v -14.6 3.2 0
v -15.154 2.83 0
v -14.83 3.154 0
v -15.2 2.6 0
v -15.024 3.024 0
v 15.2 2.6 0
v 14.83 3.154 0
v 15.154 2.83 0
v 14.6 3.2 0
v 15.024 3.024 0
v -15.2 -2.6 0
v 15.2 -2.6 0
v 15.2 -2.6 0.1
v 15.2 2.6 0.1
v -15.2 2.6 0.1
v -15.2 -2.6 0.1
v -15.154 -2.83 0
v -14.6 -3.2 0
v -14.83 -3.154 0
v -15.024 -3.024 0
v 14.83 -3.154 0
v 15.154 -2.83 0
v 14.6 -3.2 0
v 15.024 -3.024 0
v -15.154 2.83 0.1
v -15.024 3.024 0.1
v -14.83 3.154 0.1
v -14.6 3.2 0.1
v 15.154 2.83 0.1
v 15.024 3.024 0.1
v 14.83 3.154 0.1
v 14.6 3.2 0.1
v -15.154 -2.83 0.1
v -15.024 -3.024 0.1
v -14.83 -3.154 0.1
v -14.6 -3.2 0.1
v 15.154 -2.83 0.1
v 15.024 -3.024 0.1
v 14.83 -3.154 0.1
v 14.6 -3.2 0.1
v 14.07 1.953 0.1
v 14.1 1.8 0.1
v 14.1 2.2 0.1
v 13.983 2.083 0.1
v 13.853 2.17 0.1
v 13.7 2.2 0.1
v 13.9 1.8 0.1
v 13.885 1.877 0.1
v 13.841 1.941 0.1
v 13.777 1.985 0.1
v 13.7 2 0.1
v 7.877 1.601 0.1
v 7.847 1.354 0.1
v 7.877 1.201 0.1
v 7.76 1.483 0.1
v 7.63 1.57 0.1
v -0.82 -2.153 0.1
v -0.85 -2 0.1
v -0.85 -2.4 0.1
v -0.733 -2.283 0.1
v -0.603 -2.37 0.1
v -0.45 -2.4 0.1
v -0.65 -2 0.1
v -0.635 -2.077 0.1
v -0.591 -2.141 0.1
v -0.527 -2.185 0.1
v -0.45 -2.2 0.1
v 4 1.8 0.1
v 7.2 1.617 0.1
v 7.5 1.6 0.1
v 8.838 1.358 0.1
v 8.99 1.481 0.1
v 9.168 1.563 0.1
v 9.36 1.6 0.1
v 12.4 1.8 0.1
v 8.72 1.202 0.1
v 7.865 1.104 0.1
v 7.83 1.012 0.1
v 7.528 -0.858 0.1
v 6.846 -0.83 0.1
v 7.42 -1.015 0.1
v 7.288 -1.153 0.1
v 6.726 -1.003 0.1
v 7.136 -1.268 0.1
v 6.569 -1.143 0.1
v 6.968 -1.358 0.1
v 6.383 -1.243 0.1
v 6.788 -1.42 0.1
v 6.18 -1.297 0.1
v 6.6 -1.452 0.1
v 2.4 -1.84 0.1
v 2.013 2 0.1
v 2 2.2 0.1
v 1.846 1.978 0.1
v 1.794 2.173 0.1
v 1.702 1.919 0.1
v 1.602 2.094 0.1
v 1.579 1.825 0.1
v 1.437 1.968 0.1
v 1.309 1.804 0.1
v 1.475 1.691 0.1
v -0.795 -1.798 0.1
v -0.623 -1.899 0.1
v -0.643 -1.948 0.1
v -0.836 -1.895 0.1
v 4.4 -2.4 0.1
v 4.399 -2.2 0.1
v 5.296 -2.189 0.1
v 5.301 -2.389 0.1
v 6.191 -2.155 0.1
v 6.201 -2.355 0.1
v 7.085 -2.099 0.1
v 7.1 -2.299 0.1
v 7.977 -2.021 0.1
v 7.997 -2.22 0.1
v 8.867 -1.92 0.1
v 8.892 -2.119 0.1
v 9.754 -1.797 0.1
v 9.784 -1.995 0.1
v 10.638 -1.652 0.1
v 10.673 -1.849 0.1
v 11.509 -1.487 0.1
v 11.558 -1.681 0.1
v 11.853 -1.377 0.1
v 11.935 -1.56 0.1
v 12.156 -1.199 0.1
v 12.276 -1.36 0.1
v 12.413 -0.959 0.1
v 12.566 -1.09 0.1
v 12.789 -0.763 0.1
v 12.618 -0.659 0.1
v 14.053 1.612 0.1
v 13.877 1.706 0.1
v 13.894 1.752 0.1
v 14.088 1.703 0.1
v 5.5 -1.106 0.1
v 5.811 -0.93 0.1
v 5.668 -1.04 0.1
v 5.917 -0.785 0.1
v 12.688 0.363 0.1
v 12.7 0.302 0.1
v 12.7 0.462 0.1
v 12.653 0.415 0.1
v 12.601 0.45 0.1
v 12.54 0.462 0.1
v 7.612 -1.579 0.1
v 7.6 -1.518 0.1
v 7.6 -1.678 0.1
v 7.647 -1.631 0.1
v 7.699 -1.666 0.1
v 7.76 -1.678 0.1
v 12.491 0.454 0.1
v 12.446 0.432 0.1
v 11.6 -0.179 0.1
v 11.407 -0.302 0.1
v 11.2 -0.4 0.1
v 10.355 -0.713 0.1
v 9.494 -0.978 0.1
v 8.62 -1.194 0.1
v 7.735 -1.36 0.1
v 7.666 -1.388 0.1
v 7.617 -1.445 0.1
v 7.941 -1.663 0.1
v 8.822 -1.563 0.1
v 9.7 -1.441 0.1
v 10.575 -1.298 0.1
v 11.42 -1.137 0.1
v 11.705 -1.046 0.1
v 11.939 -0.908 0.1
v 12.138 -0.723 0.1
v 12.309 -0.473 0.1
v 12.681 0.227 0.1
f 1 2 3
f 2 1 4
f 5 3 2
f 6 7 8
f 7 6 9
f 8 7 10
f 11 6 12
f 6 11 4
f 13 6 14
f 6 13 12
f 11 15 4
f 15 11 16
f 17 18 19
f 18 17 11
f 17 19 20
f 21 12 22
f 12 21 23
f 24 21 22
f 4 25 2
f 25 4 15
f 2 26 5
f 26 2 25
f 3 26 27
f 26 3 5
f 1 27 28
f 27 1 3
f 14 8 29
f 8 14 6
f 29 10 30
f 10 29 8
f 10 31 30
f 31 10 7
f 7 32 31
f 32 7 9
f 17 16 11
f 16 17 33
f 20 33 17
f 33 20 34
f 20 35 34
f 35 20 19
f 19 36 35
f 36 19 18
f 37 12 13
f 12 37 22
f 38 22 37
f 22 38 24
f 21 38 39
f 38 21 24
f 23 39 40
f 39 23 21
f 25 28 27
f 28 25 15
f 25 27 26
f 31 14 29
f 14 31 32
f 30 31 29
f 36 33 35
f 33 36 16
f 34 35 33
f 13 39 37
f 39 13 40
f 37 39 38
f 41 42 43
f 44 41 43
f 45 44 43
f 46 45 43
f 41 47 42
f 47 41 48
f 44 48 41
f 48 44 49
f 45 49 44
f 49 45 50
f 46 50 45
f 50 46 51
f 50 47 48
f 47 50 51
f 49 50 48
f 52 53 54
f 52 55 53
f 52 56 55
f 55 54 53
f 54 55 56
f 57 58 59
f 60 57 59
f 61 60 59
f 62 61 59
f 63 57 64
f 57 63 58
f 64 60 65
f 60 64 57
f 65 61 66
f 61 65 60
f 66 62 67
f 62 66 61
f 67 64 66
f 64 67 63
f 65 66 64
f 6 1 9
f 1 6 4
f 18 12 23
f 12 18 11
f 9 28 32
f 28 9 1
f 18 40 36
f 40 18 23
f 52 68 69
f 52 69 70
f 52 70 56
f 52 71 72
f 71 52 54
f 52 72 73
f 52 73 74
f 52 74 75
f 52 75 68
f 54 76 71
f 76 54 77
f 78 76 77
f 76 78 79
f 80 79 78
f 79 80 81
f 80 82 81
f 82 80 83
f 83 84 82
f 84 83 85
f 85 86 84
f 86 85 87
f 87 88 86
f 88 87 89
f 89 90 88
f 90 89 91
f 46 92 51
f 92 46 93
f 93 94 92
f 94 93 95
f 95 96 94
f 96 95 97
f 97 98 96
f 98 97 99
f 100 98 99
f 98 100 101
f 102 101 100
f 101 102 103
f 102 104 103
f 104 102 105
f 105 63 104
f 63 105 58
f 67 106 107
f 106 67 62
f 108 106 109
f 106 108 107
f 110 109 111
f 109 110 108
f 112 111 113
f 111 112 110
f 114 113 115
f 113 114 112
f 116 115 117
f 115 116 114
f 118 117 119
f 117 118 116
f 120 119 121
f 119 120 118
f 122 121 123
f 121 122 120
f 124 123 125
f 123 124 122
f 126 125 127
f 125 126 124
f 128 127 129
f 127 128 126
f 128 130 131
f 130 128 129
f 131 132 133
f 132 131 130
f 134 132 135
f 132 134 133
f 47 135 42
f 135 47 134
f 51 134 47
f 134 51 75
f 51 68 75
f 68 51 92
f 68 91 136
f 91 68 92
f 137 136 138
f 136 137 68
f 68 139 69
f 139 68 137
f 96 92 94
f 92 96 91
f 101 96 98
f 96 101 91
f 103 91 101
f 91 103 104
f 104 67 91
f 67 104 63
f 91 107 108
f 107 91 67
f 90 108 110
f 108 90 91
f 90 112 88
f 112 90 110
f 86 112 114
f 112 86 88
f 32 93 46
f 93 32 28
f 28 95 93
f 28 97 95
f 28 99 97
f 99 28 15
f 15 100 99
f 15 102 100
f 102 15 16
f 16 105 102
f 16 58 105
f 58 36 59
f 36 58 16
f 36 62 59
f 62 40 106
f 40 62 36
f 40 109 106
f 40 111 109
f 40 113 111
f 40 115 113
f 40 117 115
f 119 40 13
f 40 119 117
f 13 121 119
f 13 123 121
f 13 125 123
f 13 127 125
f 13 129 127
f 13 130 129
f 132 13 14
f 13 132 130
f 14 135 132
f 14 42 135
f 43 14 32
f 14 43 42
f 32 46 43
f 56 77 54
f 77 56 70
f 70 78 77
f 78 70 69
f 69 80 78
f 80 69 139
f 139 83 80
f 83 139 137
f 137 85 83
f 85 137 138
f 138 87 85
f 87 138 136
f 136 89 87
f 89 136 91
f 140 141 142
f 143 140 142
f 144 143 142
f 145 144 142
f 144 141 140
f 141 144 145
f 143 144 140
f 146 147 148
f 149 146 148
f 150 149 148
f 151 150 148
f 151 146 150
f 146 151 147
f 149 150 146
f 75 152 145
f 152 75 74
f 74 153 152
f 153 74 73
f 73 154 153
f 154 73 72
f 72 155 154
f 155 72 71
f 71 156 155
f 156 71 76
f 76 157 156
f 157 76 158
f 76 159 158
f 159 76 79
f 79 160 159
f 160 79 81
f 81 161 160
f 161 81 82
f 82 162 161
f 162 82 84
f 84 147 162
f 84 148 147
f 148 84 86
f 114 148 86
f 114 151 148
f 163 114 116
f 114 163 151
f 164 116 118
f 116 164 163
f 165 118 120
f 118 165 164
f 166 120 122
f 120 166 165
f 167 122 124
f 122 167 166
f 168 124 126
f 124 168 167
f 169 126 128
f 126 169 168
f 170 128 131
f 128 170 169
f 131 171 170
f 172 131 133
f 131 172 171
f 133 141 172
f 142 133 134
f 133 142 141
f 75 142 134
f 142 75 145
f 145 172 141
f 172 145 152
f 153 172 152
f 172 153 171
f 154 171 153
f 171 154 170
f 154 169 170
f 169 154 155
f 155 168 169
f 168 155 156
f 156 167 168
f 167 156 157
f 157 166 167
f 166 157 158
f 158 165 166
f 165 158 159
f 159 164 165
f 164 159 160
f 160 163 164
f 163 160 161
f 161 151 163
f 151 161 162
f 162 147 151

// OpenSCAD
// file: ../p/box3u12.scad
use <../lib.scad>
function ldraw_lib__box3u12() = [
// 0 Box with 3 Parallel Faces without Any Edges
// 0 Name: box3u12.dat
// 0 Author: J.C. Tchang [tchang]
// 0 !LDRAW_ORG Primitive UPDATE 2014-02
// 0 !LICENSE Licensed under CC BY 4.0 : see CAreadme.txt
// 
// 0 BFC CERTIFY CCW
  [0,"BFC","CERTIFY"],
  [0,"BFC","CCW"],
// 
// 0 !HISTORY 2014-12-23 [PTadmin] Official Update 2014-02
// 
// 
// 4 16 -1 1 1 1 1 1 1 1 -1 -1 1 -1
  [4,16,-1,1,1,1,1,1,1,1,-1,-1,1,-1],
// 4 16 -1 1 1 -1 0 1 1 0 1 1 1 1
  [4,16,-1,1,1,-1,0,1,1,0,1,1,1,1],
// 4 16 1 1 -1 1 0 -1 -1 0 -1 -1 1 -1
  [4,16,1,1,-1,1,0,-1,-1,0,-1,-1,1,-1],
];
module ldraw_lib__box3u12(step=0, col=false, unit=2/5, alt=false, line=0.2, solid=!$preview)
    makepoly(ldraw_lib__box3u12(), step=step, col=col, unit=unit, alt=alt, line=line, solid=solid);
ldraw_lib__box3u12(line=0.2);
// file: ../p/3-16ndis.scad
use <../lib.scad>
function ldraw_lib__3_16ndis() = [
// 0 Disc Negative 0.1875
// 0 Name: 3-16ndis.dat
// 0 Author: Magnus Forsberg [MagFors]
// 0 !LDRAW_ORG Primitive UPDATE 2024-01
// 0 !LICENSE Licensed under CC BY 4.0 : see CAreadme.txt
// 
// 0 BFC CERTIFY CCW
  [0,"BFC","CERTIFY"],
  [0,"BFC","CCW"],
// 
// 0 !HISTORY 2009-05-02 [PTadmin] Official Update 2009-01
// 0 !HISTORY 2024-01-03 [MagFors] Complete regeneration, original by guyvivan
// 0 !HISTORY 2024-01-29 [OrionP] Official Update 2024-01
// 
// 3 16 1 0 1 0.9239 0 0.3827 1 0 0
  [3,16,1,0,1,0.9239,0,0.3827,1,0,0],
// 3 16 1 0 1 0.7071 0 0.7071 0.9239 0 0.3827
  [3,16,1,0,1,0.7071,0,0.7071,0.9239,0,0.3827],
// 3 16 1 0 1 0.3827 0 0.9239 0.7071 0 0.7071
  [3,16,1,0,1,0.3827,0,0.9239,0.7071,0,0.7071],
// 0 // Build by LDPartEditor (PrimGen 2.X)
];
module ldraw_lib__3_16ndis(step=0, col=false, unit=2/5, alt=false, line=0.2, solid=!$preview)
    makepoly(ldraw_lib__3_16ndis(), step=step, col=col, unit=unit, alt=alt, line=line, solid=solid);
ldraw_lib__3_16ndis(line=0.2);
// file: ../p/3-16chrd.scad
use <../lib.scad>
function ldraw_lib__3_16chrd() = [
// 0 Chord 0.1875
// 0 Name: 3-16chrd.dat
// 0 Author: Niels Karsdorp [nielsk]
// 0 !LDRAW_ORG Primitive UPDATE 2009-01
// 0 !LICENSE Licensed under CC BY 4.0 : see CAreadme.txt
// 
// 0 BFC CERTIFY CCW
  [0,"BFC","CERTIFY"],
  [0,"BFC","CCW"],
// 
// 0 !HISTORY 2009-05-02 [PTadmin] Official Update 2009-01
// 
// 
// 4 16 1 0 0 0.9239 0 0.3827 0.7071 0 0.7071 0.3827 0 0.9239
  [4,16,1,0,0,0.9239,0,0.3827,0.7071,0,0.7071,0.3827,0,0.9239],
// 0
// 
];
module ldraw_lib__3_16chrd(step=0, col=false, unit=2/5, alt=false, line=0.2, solid=!$preview)
    makepoly(ldraw_lib__3_16chrd(), step=step, col=col, unit=unit, alt=alt, line=line, solid=solid);
ldraw_lib__3_16chrd(line=0.2);
// file: ../p/1-4ring1.scad
use <../lib.scad>
function ldraw_lib__1_4ring1() = [
// 0 Ring  1 x 0.25
// 0 Name: 1-4ring1.dat
// 0 Author: Chris Dee [cwdee]
// 0 !LDRAW_ORG Primitive UPDATE 2012-01
// 0 !LICENSE Licensed under CC BY 4.0 : see CAreadme.txt
// 
// 0 BFC CERTIFY CCW
  [0,"BFC","CERTIFY"],
  [0,"BFC","CCW"],
// 
// 0 !HISTORY 2000-05-07 [PTadmin] Official Update 2000-01
// 0 !HISTORY 2002-11-22 [hafhead] Added BFC statement
// 0 !HISTORY 2002-11-30 [PTadmin] Official Update 2002-05
// 0 !HISTORY 2007-06-22 [PTadmin] Header formatted for Contributor Agreement
// 0 !HISTORY 2008-07-01 [PTadmin] Official Update 2008-01
// 0 !HISTORY 2012-02-16 [Philo] Changed to CCW
// 0 !HISTORY 2012-03-30 [PTadmin] Official Update 2012-01
// 
// 
// 4 16 2 0 0 1.8478 0 0.7654 0.9239 0 0.3827 1 0 0
  [4,16,2,0,0,1.8478,0,0.7654,0.9239,0,0.3827,1,0,0],
// 4 16 1.8478 0 0.7654 1.4142 0 1.4142 0.7071 0 0.7071 0.9239 0 0.3827
  [4,16,1.8478,0,0.7654,1.4142,0,1.4142,0.7071,0,0.7071,0.9239,0,0.3827],
// 4 16 1.4142 0 1.4142 0.7654 0 1.8478 0.3827 0 0.9239 0.7071 0 0.7071
  [4,16,1.4142,0,1.4142,0.7654,0,1.8478,0.3827,0,0.9239,0.7071,0,0.7071],
// 4 16 0.7654 0 1.8478 0 0 2 0 0 1 0.3827 0 0.9239
  [4,16,0.7654,0,1.8478,0,0,2,0,0,1,0.3827,0,0.9239],
];
module ldraw_lib__1_4ring1(step=0, col=false, unit=2/5, alt=false, line=0.2, solid=!$preview)
    makepoly(ldraw_lib__1_4ring1(), step=step, col=col, unit=unit, alt=alt, line=line, solid=solid);
ldraw_lib__1_4ring1(line=0.2);
// file: ../p/1-4cyli.scad
use <../lib.scad>
function ldraw_lib__1_4cyli() = [
// 0 Cylinder 0.25
// 0 Name: 1-4cyli.dat
// 0 Author: James Jessiman
// 0 !LDRAW_ORG Primitive UPDATE 2012-01
// 0 !LICENSE Licensed under CC BY 4.0 : see CAreadme.txt
// 
// 0 BFC CERTIFY CCW
  [0,"BFC","CERTIFY"],
  [0,"BFC","CCW"],
// 
// 0 !HISTORY 2002-03-23 [sbliss] Added BFC statement.
// 0 !HISTORY 2002-04-25 [PTadmin] Official Update 2002-02
// 0 !HISTORY 2007-06-22 [PTadmin] Header formatted for Contributor Agreement
// 0 !HISTORY 2008-07-01 [PTadmin] Official Update 2008-01
// 0 !HISTORY 2012-02-16 [Philo] Changed to CCW
// 0 !HISTORY 2012-03-30 [PTadmin] Official Update 2012-01
// 
// 
// 4 16 1 1 0 0.9239 1 0.3827 0.9239 0 0.3827 1 0 0
  [4,16,1,1,0,0.9239,1,0.3827,0.9239,0,0.3827,1,0,0],
// 5 24 1 0 0 1 1 0 0.9239 0 0.3827 1 0 -1
  [5,24,1,0,0,1,1,0,0.9239,0,0.3827,1,0,-1],
// 4 16 0.9239 1 0.3827 0.7071 1 0.7071 0.7071 0 0.7071 0.9239 0 0.3827
  [4,16,0.9239,1,0.3827,0.7071,1,0.7071,0.7071,0,0.7071,0.9239,0,0.3827],
// 5 24 0.9239 0 0.3827 0.9239 1 0.3827 0.7071 0 0.7071 1 0 0
  [5,24,0.9239,0,0.3827,0.9239,1,0.3827,0.7071,0,0.7071,1,0,0],
// 4 16 0.7071 1 0.7071 0.3827 1 0.9239 0.3827 0 0.9239 0.7071 0 0.7071
  [4,16,0.7071,1,0.7071,0.3827,1,0.9239,0.3827,0,0.9239,0.7071,0,0.7071],
// 5 24 0.7071 0 0.7071 0.7071 1 0.7071 0.3827 0 0.9239 0.9239 0 0.3827
  [5,24,0.7071,0,0.7071,0.7071,1,0.7071,0.3827,0,0.9239,0.9239,0,0.3827],
// 4 16 0.3827 1 0.9239 0 1 1 0 0 1 0.3827 0 0.9239
  [4,16,0.3827,1,0.9239,0,1,1,0,0,1,0.3827,0,0.9239],
// 5 24 0.3827 0 0.9239 0.3827 1 0.9239 0 0 1 0.7071 0 0.7071
  [5,24,0.3827,0,0.9239,0.3827,1,0.9239,0,0,1,0.7071,0,0.7071],
// 5 24 0 0 1 0 1 1 0.3827 0 0.9239 -1 0 1
  [5,24,0,0,1,0,1,1,0.3827,0,0.9239,-1,0,1],
];
module ldraw_lib__1_4cyli(step=0, col=false, unit=2/5, alt=false, line=0.2, solid=!$preview)
    makepoly(ldraw_lib__1_4cyli(), step=step, col=col, unit=unit, alt=alt, line=line, solid=solid);
ldraw_lib__1_4cyli(line=0.2);
// file: ../p/1-4ndis.scad
use <../lib.scad>
function ldraw_lib__1_4ndis() = [
// 0 Disc Negative 0.25
// 0 Name: 1-4ndis.dat
// 0 Author: James Jessiman
// 0 !LDRAW_ORG Primitive UPDATE 2012-01
// 0 !LICENSE Licensed under CC BY 4.0 : see CAreadme.txt
// 
// 0 BFC CERTIFY CCW
  [0,"BFC","CERTIFY"],
  [0,"BFC","CCW"],
// 
// 0 !HISTORY 2002-03-23 [sbliss] Added BFC Statement
// 0 !HISTORY 2002-04-25 [PTadmin] Official Update 2002-02
// 0 !HISTORY 2007-06-22 [PTadmin] Header formatted for Contributor Agreement
// 0 !HISTORY 2008-07-01 [PTadmin] Official Update 2008-01
// 0 !HISTORY 2012-02-16 [Philo] Changed to CCW
// 0 !HISTORY 2012-03-30 [PTadmin] Official Update 2012-01
// 
// 
// 3 16 0.9239 0 0.3827 1 0 0 1 0 1
  [3,16,0.9239,0,0.3827,1,0,0,1,0,1],
// 3 16 0.7071 0 0.7071 0.9239 0 0.3827 1 0 1
  [3,16,0.7071,0,0.7071,0.9239,0,0.3827,1,0,1],
// 3 16 0.3827 0 0.9239 0.7071 0 0.7071 1 0 1
  [3,16,0.3827,0,0.9239,0.7071,0,0.7071,1,0,1],
// 3 16 0 0 1 0.3827 0 0.9239 1 0 1
  [3,16,0,0,1,0.3827,0,0.9239,1,0,1],
];
module ldraw_lib__1_4ndis(step=0, col=false, unit=2/5, alt=false, line=0.2, solid=!$preview)
    makepoly(ldraw_lib__1_4ndis(), step=step, col=col, unit=unit, alt=alt, line=line, solid=solid);
ldraw_lib__1_4ndis(line=0.2);
// file: ../p/1-4chrd.scad
use <../lib.scad>
function ldraw_lib__1_4chrd() = [
// 0 Chord 0.25
// 0 Name: 1-4chrd.dat
// 0 Author: Max Martin Richter [MMR1988]
// 0 !LDRAW_ORG Primitive UPDATE 2023-05
// 0 !LICENSE Licensed under CC BY 4.0 : see CAreadme.txt
// 
// 0 BFC CERTIFY CCW
  [0,"BFC","CERTIFY"],
  [0,"BFC","CCW"],
// 
// 0 !HISTORY 2004-04-22 [PTadmin] Official Update 2004-02
// 0 !HISTORY 2007-10-09 [PTadmin] Header formatted for Contributor Agreement
// 0 !HISTORY 2008-07-01 [PTadmin] Official Update 2008-01
// 0 !HISTORY 2012-08-02 [MMR1988] Re-creation with PrimGen2 and Rectifier
// 0 !HISTORY 2012-08-09 [PTadmin] Official Update 2012-02
// 0 !HISTORY 2023-10-27 [OrionP] Change author to MMR1988 from hafhead
// 0 !HISTORY 2023-10-31 [OrionP] Official Update 2023-05
// 
// 4 16 0.9239 0 0.3827 0.3827 0 0.9239 0 0 1 1 0 0
  [4,16,0.9239,0,0.3827,0.3827,0,0.9239,0,0,1,1,0,0],
// 3 16 0.7071 0 0.7071 0.3827 0 0.9239 0.9239 0 0.3827
  [3,16,0.7071,0,0.7071,0.3827,0,0.9239,0.9239,0,0.3827],
];
module ldraw_lib__1_4chrd(step=0, col=false, unit=2/5, alt=false, line=0.2, solid=!$preview)
    makepoly(ldraw_lib__1_4chrd(), step=step, col=col, unit=unit, alt=alt, line=line, solid=solid);
ldraw_lib__1_4chrd(line=0.2);
// main file
use <../lib.scad>
use <../p/1-4chrd.scad>
use <../p/1-4ndis.scad>
use <s/6141955ds01.scad>
function ldraw_lib__6141955d() = [
// 0 Sticker  0.8 x  3.8 with Black Air Vents and White Reflex on Blue Background Left (Needs Work)
// 0 Name: 6141955d.dat
// 0 Author: Massimo Maso [Sirio]
// 0 !LDRAW_ORG Part UPDATE 2025-03
// 0 !LICENSE Licensed under CC BY 4.0 : see CAreadme.txt
// 
// 0 !HELP Needs work: Some parts should be halftones.
// 0 !HELP I indicated them as halftone color code disc - color code ndis.
// 0 !HELP For now I don't have enough information to create the matrix of dots.
// 
// 0 BFC CERTIFY CCW
  [0,"BFC","CERTIFY"],
  [0,"BFC","CCW"],
// 
// 0 !KEYWORDS Bricklink 75871stk01a, Brickowl 197362, Ford, GT, Mustang
// 0 !KEYWORDS Rebrickable 24746, Set 75871, Speed Champions
// 
// 0 !HISTORY 2025-03-30 [OrionP] Official Update 2025-03
// 
// 
// 0 // Subparts
// 1 16 0 0 0 1 0 0 0 1 0 0 0 1 s\6141955ds01.dat
  [1,16,0,0,0,1,0,0,0,1,0,0,0,1, ldraw_lib__s__6141955ds01()],
// 0 // Primitives
// 1 1 31.35 -.25 .7544 .4 0 0 0 1 0 0 0 .4 1-4ndis.dat
  [1,1,31.35,-.25,.7544,.4,0,0,0,1,0,0,0,.4, ldraw_lib__1_4ndis()],
// 1 15 31.35 -.25 .7544 .4 0 0 0 1 0 0 0 .4 1-4chrd.dat
  [1,15,31.35,-.25,.7544,.4,0,0,0,1,0,0,0,.4, ldraw_lib__1_4chrd()],
// 1 1 19.4 -.25 -3.7947 -.4 0 0 0 1 0 0 0 -.4 1-4ndis.dat
  [1,1,19.4,-.25,-3.7947,-.4,0,0,0,1,0,0,0,-.4, ldraw_lib__1_4ndis()],
// 1 15 19.4 -.25 -3.7947 -.4 0 0 0 1 0 0 0 -.4 1-4chrd.dat
  [1,15,19.4,-.25,-3.7947,-.4,0,0,0,1,0,0,0,-.4, ldraw_lib__1_4chrd()],
// 0 // Top face
// 0 // Blue faces
// 4 1 23.4 -.25 4 31.227 -.25 1.135 31.35 -.25 1.1544 31 -.25 4.5
  [4,1,23.4,-.25,4,31.227,-.25,1.135,31.35,-.25,1.1544,31,-.25,4.5],
// 4 1 23.4 -.25 4 22.9195 -.25 3.9084 31.1159 -.25 1.0788 31.227 -.25 1.135
  [4,1,23.4,-.25,4,22.9195,-.25,3.9084,31.1159,-.25,1.0788,31.227,-.25,1.135],
// 4 1 22.4756 -.25 3.703 29 -.25 -.4485 31.1159 -.25 1.0788 22.9195 -.25 3.9084
  [4,1,22.4756,-.25,3.703,29,-.25,-.4485,31.1159,-.25,1.0788,22.9195,-.25,3.9084],
// 4 1 22.4756 -.25 3.703 22.0948 -.25 3.3959 28.5167 -.25 -.7546 29 -.25 -.4485
  [4,1,22.4756,-.25,3.703,22.0948,-.25,3.3959,28.5167,-.25,-.7546,29,-.25,-.4485],
// 4 1 21.8 -.25 3.0056 28 -.25 -1 28.5167 -.25 -.7546 22.0948 -.25 3.3959
  [4,1,21.8,-.25,3.0056,28,-.25,-1,28.5167,-.25,-.7546,22.0948,-.25,3.3959],
// 4 1 21.8 -.25 3.0056 23.7362 -.25 -2.444 25.8884 -.25 -1.782 28 -.25 -1
  [4,1,21.8,-.25,3.0056,23.7362,-.25,-2.444,25.8884,-.25,-1.782,28,-.25,-1],
// 4 1 21.8 -.25 3.0056 18.8211 -.25 -2.145 21.5502 -.25 -2.9838 23.7362 -.25 -2.444
  [4,1,21.8,-.25,3.0056,18.8211,-.25,-2.145,21.5502,-.25,-2.9838,23.7362,-.25,-2.444],
// 4 1 18.5504 -.25 -2.5374 19.3372 -.25 -3.3997 21.5502 -.25 -2.9838 18.8211 -.25 -2.145
  [4,1,18.5504,-.25,-2.5374,19.3372,-.25,-3.3997,21.5502,-.25,-2.9838,18.8211,-.25,-2.145],
// 4 1 18.5504 -.25 -2.5374 18.221 -.25 -2.8819 19.1648 -.25 -3.4712 19.3372 -.25 -3.3997
  [4,1,18.5504,-.25,-2.5374,18.221,-.25,-2.8819,19.1648,-.25,-3.4712,19.3372,-.25,-3.3997],
// 4 1 17.8412 -.25 -3.17 19.0436 -.25 -3.6132 19.1648 -.25 -3.4712 18.221 -.25 -2.8819
  [4,1,17.8412,-.25,-3.17,19.0436,-.25,-3.6132,19.1648,-.25,-3.4712,18.221,-.25,-2.8819],
// 3 1 17.8412 -.25 -3.17 19 -.25 -3.7947 19.0436 -.25 -3.6132
  [3,1,17.8412,-.25,-3.17,19,-.25,-3.7947,19.0436,-.25,-3.6132],
// 4 1 17.8412 -.25 -3.17 17.4205 -.25 -3.3942 19 -.25 -4.1947 19 -.25 -3.7947
  [4,1,17.8412,-.25,-3.17,17.4205,-.25,-3.3942,19,-.25,-4.1947,19,-.25,-3.7947],
// 3 1 19.9424 -.25 -5.0521 19 -.25 -4.1947 17.4205 -.25 -3.3942
  [3,1,19.9424,-.25,-5.0521,19,-.25,-4.1947,17.4205,-.25,-3.3942],
// 3 1 19.9424 -.25 -5.0521 19.4 -.25 -4.1947 19 -.25 -4.1947
  [3,1,19.9424,-.25,-5.0521,19.4,-.25,-4.1947,19,-.25,-4.1947],
// 4 1 19.9424 -.25 -5.0521 22.1675 -.25 -4.8005 19.8525 -.25 -4.1565 19.4 -.25 -4.1947
  [4,1,19.9424,-.25,-5.0521,22.1675,-.25,-4.8005,19.8525,-.25,-4.1565,19.4,-.25,-4.1947],
// 4 1 24.3856 -.25 -4.4933 22.0552 -.25 -3.9075 19.8525 -.25 -4.1565 22.1675 -.25 -4.8005
  [4,1,24.3856,-.25,-4.4933,22.0552,-.25,-3.9075,19.8525,-.25,-4.1565,22.1675,-.25,-4.8005],
// 4 1 24.3856 -.25 -4.4933 26.5953 -.25 -4.1307 24.251 -.25 -3.6034 22.0552 -.25 -3.9075
  [4,1,24.3856,-.25,-4.4933,26.5953,-.25,-4.1307,24.251,-.25,-3.6034,22.0552,-.25,-3.9075],
// 4 1 28.7713 -.25 -3.7176 26.4385 -.25 -3.2444 24.251 -.25 -3.6034 26.5953 -.25 -4.1307
  [4,1,28.7713,-.25,-3.7176,26.4385,-.25,-3.2444,24.251,-.25,-3.6034,26.5953,-.25,-4.1307],
// 4 1 28.7713 -.25 -3.7176 29.6318 -.25 -3.4416 28.5491 -.25 -2.8437 26.4385 -.25 -3.2444
  [4,1,28.7713,-.25,-3.7176,29.6318,-.25,-3.4416,28.5491,-.25,-2.8437,26.4385,-.25,-3.2444],
// 4 1 30.3899 -.25 -2.9967 29.2621 -.25 -2.615 28.5491 -.25 -2.8437 29.6318 -.25 -3.4416
  [4,1,30.3899,-.25,-2.9967,29.2621,-.25,-2.615,28.5491,-.25,-2.8437,29.6318,-.25,-3.4416],
// 4 1 30.3899 -.25 -2.9967 31.0324 -.25 -2.3968 29.8485 -.25 -2.2709 29.2621 -.25 -2.615
  [4,1,30.3899,-.25,-2.9967,31.0324,-.25,-2.3968,29.8485,-.25,-2.2709,29.2621,-.25,-2.615],
// 4 1 31.5439 -.25 -1.648 30.3454 -.25 -1.8069 29.8485 -.25 -2.2709 31.0324 -.25 -2.3968
  [4,1,31.5439,-.25,-1.648,30.3454,-.25,-1.8069,29.8485,-.25,-2.2709,31.0324,-.25,-2.3968],
// 3 1 31.5439 -.25 -1.648 30.7728 -.25 -1.1813 30.3454 -.25 -1.8069
  [3,1,31.5439,-.25,-1.648,30.7728,-.25,-1.1813,30.3454,-.25,-1.8069],
// 4 1 31.5439 -.25 -1.648 34.6914 -.25 4.2651 31.7031 -.25 .5665 30.7728 -.25 -1.1813
  [4,1,31.5439,-.25,-1.648,34.6914,-.25,4.2651,31.7031,-.25,.5665,30.7728,-.25,-1.1813],
// 3 1 34.6914 -.25 4.2651 31.75 -.25 .7544 31.7031 -.25 .5665
  [3,1,34.6914,-.25,4.2651,31.75,-.25,.7544,31.7031,-.25,.5665],
// 4 1 34.6914 -.25 4.2651 34.7351 -.25 4.3789 31.75 -.25 1.1544 31.75 -.25 .7544
  [4,1,34.6914,-.25,4.2651,34.7351,-.25,4.3789,31.75,-.25,1.1544,31.75,-.25,.7544],
// 4 1 31 -.25 4.5 31.35 -.25 1.1544 31.75 -.25 1.1544 34.7351 -.25 4.3789
  [4,1,31,-.25,4.5,31.35,-.25,1.1544,31.75,-.25,1.1544,34.7351,-.25,4.3789],
// 0 // White faces - Actually halftone 1 disc - 15 ndis
// 4 15 31.227 -.25 1.135 31.7031 -.25 .5665 31.75 -.25 .7544 31.35 -.25 1.1544
  [4,15,31.227,-.25,1.135,31.7031,-.25,.5665,31.75,-.25,.7544,31.35,-.25,1.1544],
// 4 15 31.227 -.25 1.135 31.1159 -.25 1.0788 30.7728 -.25 -1.1813 31.7031 -.25 .5665
  [4,15,31.227,-.25,1.135,31.1159,-.25,1.0788,30.7728,-.25,-1.1813,31.7031,-.25,.5665],
// 4 15 29 -.25 -.4485 30.3454 -.25 -1.8069 30.7728 -.25 -1.1813 31.1159 -.25 1.0788
  [4,15,29,-.25,-.4485,30.3454,-.25,-1.8069,30.7728,-.25,-1.1813,31.1159,-.25,1.0788],
// 4 15 29 -.25 -.4485 28.5167 -.25 -.7546 29.8485 -.25 -2.2709 30.3454 -.25 -1.8069
  [4,15,29,-.25,-.4485,28.5167,-.25,-.7546,29.8485,-.25,-2.2709,30.3454,-.25,-1.8069],
// 4 15 28 -.25 -1 29.2621 -.25 -2.615 29.8485 -.25 -2.2709 28.5167 -.25 -.7546
  [4,15,28,-.25,-1,29.2621,-.25,-2.615,29.8485,-.25,-2.2709,28.5167,-.25,-.7546],
// 4 15 28 -.25 -1 25.8884 -.25 -1.782 28.5491 -.25 -2.8437 29.2621 -.25 -2.615
  [4,15,28,-.25,-1,25.8884,-.25,-1.782,28.5491,-.25,-2.8437,29.2621,-.25,-2.615],
// 4 15 23.7362 -.25 -2.444 26.4385 -.25 -3.2444 28.5491 -.25 -2.8437 25.8884 -.25 -1.782
  [4,15,23.7362,-.25,-2.444,26.4385,-.25,-3.2444,28.5491,-.25,-2.8437,25.8884,-.25,-1.782],
// 4 15 23.7362 -.25 -2.444 21.5502 -.25 -2.9838 24.251 -.25 -3.6034 26.4385 -.25 -3.2444
  [4,15,23.7362,-.25,-2.444,21.5502,-.25,-2.9838,24.251,-.25,-3.6034,26.4385,-.25,-3.2444],
// 4 15 19.3372 -.25 -3.3997 22.0552 -.25 -3.9075 24.251 -.25 -3.6034 21.5502 -.25 -2.9838
  [4,15,19.3372,-.25,-3.3997,22.0552,-.25,-3.9075,24.251,-.25,-3.6034,21.5502,-.25,-2.9838],
// 4 15 19.3372 -.25 -3.3997 19.1648 -.25 -3.4712 19.8525 -.25 -4.1565 22.0552 -.25 -3.9075
  [4,15,19.3372,-.25,-3.3997,19.1648,-.25,-3.4712,19.8525,-.25,-4.1565,22.0552,-.25,-3.9075],
// 4 15 19.0436 -.25 -3.6132 19.4 -.25 -4.1947 19.8525 -.25 -4.1565 19.1648 -.25 -3.4712
  [4,15,19.0436,-.25,-3.6132,19.4,-.25,-4.1947,19.8525,-.25,-4.1565,19.1648,-.25,-3.4712],
// 3 15 19.0436 -.25 -3.6132 19 -.25 -3.7947 19.4 -.25 -4.1947
  [3,15,19.0436,-.25,-3.6132,19,-.25,-3.7947,19.4,-.25,-4.1947],
];
module ldraw_lib__6141955d(step=0, col=false, unit=2/5, alt=false, line=0.2, solid=!$preview)
    makepoly(ldraw_lib__6141955d(), step=step, col=col, unit=unit, alt=alt, line=line, solid=solid);
ldraw_lib__6141955d(line=0.2);
